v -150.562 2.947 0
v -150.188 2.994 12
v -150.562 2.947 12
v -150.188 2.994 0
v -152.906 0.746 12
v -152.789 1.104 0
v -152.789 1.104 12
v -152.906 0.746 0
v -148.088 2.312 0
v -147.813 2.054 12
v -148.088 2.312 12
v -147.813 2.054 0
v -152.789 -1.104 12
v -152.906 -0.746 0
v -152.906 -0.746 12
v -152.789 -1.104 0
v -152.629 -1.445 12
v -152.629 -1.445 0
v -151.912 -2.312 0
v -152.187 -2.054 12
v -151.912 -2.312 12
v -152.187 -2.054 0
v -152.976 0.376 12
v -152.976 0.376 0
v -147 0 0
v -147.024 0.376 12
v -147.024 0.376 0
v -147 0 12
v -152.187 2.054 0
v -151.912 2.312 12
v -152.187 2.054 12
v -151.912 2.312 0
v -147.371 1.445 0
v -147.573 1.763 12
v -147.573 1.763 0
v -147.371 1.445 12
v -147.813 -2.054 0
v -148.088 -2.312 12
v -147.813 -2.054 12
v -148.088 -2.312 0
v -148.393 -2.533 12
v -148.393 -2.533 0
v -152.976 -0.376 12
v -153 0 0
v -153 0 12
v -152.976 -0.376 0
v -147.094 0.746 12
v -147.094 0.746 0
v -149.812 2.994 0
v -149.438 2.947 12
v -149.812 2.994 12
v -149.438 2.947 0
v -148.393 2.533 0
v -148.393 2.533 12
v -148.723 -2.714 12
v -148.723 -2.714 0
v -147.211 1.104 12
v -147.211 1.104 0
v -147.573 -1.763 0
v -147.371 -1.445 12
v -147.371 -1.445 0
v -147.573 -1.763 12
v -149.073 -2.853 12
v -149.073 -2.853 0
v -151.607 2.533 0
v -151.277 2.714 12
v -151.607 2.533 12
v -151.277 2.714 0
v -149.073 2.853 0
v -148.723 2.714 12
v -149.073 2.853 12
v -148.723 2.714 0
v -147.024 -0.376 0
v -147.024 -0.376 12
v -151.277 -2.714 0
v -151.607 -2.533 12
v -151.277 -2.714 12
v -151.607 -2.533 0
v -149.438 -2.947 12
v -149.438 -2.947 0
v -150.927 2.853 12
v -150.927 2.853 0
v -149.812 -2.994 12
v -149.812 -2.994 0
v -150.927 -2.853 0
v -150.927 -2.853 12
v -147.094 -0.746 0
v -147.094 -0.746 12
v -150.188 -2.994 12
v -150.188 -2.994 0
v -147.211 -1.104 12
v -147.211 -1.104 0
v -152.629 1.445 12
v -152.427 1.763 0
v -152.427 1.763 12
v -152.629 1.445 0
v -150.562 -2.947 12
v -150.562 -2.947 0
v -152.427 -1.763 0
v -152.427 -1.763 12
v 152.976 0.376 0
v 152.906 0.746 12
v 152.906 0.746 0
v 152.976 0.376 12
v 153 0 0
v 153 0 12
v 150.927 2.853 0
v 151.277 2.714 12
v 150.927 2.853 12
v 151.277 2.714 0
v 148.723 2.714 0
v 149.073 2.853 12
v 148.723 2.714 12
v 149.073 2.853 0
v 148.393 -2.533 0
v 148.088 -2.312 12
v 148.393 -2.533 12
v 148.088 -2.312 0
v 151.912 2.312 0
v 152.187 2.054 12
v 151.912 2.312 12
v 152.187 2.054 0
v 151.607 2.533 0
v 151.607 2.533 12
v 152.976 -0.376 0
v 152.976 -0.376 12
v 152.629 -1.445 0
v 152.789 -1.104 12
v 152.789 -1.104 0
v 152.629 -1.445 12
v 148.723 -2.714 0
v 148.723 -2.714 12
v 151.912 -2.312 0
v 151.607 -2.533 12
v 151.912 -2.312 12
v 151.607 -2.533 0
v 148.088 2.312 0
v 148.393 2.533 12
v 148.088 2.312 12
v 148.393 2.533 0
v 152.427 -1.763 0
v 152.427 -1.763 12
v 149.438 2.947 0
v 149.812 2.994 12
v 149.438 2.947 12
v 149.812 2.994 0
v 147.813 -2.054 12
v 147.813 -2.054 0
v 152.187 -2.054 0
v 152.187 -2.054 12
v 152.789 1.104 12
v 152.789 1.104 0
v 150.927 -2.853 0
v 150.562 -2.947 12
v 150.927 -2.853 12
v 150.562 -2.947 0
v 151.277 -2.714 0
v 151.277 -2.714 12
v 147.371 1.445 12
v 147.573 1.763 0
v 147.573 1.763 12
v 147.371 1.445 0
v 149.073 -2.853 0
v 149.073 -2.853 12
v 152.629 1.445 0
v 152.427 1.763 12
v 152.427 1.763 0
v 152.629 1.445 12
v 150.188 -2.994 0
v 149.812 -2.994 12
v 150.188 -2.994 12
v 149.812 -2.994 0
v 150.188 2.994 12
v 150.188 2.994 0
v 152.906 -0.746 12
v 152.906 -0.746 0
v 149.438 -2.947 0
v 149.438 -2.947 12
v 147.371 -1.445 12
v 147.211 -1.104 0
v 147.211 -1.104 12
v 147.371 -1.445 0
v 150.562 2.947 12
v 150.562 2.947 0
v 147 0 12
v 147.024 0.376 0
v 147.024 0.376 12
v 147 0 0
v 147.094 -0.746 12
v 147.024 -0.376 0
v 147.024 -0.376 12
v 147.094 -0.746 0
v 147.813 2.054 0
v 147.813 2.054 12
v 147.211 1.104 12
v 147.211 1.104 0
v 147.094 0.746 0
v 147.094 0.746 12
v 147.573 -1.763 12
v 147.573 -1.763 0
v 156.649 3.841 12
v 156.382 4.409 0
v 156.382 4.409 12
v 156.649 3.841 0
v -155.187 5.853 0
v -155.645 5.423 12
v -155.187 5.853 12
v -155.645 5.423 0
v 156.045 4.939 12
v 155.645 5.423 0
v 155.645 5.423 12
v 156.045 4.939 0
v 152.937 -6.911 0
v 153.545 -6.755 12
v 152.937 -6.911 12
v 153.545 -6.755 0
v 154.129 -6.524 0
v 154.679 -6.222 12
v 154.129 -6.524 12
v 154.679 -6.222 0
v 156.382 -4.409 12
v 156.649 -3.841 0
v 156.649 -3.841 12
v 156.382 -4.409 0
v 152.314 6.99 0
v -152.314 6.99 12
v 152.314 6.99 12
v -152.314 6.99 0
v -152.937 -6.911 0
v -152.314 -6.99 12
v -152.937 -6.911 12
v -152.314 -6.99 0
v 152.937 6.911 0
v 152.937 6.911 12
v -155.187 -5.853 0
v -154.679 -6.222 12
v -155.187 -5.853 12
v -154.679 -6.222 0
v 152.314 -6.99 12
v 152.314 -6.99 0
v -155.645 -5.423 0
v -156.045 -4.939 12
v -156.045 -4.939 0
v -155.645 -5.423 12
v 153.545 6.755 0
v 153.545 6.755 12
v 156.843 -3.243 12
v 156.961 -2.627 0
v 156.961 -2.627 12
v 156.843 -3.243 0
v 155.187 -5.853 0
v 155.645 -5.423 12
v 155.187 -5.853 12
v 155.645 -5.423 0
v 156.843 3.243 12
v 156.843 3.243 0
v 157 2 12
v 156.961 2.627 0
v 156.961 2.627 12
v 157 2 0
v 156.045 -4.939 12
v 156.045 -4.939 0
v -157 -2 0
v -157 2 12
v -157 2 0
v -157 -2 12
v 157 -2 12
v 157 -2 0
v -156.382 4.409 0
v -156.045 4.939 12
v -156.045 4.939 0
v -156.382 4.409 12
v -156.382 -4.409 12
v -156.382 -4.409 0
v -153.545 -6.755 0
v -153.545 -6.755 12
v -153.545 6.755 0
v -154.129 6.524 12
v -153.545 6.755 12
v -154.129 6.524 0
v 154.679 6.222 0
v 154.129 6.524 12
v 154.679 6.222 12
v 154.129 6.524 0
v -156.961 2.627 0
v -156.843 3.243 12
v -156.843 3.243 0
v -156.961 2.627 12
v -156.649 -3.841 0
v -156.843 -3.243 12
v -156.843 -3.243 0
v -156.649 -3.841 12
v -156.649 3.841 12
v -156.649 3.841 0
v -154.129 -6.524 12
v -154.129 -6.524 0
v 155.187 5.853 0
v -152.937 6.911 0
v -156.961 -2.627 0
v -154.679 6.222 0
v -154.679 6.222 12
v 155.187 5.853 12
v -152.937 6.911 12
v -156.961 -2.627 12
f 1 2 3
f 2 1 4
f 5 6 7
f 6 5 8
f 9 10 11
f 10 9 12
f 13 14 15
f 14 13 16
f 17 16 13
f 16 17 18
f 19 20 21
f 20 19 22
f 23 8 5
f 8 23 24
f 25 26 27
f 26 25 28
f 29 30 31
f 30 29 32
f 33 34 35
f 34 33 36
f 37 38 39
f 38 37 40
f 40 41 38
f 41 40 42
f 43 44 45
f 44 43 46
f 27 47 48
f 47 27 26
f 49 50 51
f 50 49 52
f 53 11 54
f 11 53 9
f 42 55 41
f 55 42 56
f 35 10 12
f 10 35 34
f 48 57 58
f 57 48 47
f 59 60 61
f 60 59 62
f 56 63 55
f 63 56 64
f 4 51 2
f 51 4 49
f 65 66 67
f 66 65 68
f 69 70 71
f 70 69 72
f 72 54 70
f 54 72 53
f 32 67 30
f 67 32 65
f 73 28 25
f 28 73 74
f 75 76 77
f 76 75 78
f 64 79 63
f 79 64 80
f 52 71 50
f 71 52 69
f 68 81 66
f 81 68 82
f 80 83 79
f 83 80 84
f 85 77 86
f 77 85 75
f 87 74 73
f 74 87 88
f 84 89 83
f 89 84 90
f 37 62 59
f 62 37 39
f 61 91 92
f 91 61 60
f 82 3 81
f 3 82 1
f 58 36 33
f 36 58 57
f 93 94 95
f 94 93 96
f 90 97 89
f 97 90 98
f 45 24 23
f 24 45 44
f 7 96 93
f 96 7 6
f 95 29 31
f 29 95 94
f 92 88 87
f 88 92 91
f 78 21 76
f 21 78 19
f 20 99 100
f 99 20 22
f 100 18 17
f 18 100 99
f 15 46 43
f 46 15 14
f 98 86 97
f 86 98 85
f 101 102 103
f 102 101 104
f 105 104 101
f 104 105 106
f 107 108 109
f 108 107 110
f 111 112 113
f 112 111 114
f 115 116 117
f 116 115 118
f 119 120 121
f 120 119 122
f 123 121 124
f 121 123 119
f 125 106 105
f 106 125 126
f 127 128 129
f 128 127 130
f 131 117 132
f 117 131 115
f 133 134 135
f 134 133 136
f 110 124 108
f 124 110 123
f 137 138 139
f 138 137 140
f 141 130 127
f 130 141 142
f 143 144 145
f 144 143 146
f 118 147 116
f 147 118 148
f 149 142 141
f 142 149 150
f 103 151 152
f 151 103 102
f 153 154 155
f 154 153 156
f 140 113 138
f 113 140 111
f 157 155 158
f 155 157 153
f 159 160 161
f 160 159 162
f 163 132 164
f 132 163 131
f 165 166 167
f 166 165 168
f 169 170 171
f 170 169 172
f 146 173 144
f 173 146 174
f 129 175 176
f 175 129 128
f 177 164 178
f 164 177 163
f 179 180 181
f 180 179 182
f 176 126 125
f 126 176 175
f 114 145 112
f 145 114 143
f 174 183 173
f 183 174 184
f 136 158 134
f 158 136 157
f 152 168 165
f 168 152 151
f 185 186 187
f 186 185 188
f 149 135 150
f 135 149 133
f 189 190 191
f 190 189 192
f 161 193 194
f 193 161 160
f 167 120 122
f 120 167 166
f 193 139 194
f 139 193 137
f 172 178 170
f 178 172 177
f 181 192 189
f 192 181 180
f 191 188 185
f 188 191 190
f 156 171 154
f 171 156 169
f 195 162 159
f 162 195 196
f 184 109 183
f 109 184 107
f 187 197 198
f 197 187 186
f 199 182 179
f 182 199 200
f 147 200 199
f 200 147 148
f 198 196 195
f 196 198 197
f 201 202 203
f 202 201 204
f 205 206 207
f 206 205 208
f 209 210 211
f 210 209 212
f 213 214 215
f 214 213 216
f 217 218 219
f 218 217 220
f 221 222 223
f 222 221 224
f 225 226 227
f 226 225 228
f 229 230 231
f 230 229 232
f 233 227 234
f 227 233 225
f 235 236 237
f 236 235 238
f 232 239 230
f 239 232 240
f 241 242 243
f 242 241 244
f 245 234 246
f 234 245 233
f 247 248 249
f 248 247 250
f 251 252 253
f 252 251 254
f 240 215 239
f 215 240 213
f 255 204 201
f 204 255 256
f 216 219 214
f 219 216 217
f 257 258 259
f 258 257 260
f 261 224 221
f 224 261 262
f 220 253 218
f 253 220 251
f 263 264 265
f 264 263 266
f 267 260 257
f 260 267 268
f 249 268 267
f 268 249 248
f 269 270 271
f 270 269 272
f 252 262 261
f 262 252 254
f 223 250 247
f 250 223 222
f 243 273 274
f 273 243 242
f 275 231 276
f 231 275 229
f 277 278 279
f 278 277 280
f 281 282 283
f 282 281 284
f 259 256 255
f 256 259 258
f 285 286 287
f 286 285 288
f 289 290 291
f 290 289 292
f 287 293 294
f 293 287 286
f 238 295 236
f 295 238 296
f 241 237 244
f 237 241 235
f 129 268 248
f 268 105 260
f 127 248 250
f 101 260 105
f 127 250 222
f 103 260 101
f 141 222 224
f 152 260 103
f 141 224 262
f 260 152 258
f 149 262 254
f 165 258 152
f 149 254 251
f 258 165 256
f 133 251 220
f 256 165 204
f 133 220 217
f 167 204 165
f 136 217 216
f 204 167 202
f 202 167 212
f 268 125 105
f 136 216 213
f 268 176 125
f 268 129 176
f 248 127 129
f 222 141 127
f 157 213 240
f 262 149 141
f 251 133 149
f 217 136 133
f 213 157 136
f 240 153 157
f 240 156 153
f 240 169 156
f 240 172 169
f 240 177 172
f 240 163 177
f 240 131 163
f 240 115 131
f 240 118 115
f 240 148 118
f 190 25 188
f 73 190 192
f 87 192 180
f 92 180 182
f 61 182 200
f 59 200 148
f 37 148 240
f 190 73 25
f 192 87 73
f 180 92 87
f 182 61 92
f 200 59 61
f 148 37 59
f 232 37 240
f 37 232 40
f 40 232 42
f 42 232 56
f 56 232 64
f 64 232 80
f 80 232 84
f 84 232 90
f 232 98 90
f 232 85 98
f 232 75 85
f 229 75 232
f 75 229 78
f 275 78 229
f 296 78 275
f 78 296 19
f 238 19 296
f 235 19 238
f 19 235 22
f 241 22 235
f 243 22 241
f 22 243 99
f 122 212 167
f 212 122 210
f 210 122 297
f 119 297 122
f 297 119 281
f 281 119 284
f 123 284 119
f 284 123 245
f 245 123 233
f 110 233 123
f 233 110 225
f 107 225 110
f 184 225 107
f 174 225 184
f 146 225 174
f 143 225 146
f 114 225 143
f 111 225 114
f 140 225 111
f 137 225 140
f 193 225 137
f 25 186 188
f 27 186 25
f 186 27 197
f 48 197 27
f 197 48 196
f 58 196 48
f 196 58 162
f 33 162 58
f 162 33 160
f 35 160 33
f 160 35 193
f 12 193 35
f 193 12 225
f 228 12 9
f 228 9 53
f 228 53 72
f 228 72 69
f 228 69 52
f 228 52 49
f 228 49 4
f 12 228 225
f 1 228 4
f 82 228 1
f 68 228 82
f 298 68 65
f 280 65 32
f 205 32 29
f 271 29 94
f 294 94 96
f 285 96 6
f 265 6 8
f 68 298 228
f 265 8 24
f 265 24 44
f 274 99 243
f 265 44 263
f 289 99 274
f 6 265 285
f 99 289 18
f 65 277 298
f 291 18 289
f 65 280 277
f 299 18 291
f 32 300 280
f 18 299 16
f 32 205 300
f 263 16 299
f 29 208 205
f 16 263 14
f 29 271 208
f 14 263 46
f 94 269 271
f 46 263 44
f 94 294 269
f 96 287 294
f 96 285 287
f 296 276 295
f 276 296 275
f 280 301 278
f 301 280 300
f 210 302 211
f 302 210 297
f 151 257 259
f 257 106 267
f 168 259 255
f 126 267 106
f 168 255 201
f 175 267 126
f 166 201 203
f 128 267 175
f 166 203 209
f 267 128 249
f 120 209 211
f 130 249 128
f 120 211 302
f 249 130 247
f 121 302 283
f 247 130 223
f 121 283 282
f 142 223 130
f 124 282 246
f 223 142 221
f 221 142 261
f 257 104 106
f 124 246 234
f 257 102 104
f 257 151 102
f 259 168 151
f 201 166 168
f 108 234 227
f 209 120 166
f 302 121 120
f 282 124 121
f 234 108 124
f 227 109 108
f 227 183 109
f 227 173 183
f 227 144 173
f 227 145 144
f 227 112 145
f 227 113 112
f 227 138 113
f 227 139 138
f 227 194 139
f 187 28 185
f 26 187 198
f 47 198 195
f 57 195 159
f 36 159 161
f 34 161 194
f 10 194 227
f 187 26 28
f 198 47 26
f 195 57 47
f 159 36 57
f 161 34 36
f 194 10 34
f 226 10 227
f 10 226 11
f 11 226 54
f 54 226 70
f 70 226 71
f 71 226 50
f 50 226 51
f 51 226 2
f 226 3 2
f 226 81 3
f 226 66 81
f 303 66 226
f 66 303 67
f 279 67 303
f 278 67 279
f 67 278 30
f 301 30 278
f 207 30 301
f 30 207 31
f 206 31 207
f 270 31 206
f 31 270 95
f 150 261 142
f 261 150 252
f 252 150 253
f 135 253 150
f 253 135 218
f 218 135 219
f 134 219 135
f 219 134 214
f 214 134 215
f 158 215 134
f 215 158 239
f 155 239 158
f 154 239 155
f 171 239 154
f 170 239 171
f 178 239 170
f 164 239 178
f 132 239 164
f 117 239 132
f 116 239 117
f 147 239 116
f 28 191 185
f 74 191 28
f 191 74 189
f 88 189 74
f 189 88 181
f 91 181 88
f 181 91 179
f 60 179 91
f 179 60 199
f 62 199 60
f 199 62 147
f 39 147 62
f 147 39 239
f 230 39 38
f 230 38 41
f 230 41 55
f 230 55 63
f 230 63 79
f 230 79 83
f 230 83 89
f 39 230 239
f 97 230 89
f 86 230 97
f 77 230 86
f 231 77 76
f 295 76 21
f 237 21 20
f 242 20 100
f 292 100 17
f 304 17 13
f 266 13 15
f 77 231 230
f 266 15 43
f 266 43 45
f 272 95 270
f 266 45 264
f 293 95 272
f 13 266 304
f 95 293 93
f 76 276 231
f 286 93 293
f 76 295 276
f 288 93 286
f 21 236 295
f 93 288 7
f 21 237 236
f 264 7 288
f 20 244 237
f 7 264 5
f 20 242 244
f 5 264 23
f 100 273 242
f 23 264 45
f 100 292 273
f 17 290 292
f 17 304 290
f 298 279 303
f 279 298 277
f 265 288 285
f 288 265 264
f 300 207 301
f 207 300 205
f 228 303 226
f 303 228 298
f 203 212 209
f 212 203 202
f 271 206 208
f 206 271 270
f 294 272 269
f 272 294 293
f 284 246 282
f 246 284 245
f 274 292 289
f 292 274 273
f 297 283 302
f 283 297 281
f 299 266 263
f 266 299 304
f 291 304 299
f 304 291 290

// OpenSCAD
$fn = 50;


difference() {
	union() {
		hull() {
			translate(v = [-152.0000000000, 2.0000000000, 0]) {
				cylinder(h = 12, r = 5);
			}
			translate(v = [152.0000000000, 2.0000000000, 0]) {
				cylinder(h = 12, r = 5);
			}
			translate(v = [-152.0000000000, -2.0000000000, 0]) {
				cylinder(h = 12, r = 5);
			}
			translate(v = [152.0000000000, -2.0000000000, 0]) {
				cylinder(h = 12, r = 5);
			}
		}
	}
	union() {
		translate(v = [-150.0000000000, 0.0000000000, -100.0000000000]) {
			cylinder(h = 200, r = 3.0000000000);
		}
		translate(v = [-150.0000000000, 0.0000000000, -100.0000000000]) {
			cylinder(h = 200, r = 3.0000000000);
		}
		translate(v = [150.0000000000, 0.0000000000, -100.0000000000]) {
			cylinder(h = 200, r = 3.0000000000);
		}
		translate(v = [150.0000000000, 0.0000000000, -100.0000000000]) {
			cylinder(h = 200, r = 3.0000000000);
		}
	}
}
